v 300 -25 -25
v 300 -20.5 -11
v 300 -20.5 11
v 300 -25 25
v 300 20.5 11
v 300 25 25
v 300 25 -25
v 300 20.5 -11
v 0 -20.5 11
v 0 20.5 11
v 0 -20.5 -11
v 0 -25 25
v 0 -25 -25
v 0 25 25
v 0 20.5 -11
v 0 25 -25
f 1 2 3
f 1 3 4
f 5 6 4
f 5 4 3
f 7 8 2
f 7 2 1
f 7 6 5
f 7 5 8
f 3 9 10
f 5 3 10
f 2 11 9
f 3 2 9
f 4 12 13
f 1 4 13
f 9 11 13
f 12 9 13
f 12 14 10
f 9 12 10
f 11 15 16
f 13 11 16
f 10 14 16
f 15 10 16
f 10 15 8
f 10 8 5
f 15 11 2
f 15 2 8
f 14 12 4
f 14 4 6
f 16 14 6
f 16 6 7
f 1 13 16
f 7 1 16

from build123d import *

# Parameters (mm, degrees)
SKETCH1_W           = 50
SKETCH1_H           = 50
BOSS_EXTRUDE1_DEPTH = 300
CUT_EXTRUDE2_REACH  = 304.076
SKETCH3_W           = 22
SKETCH3_H           = 41


with BuildPart() as part:
    # Sketch1 → Boss-Extrude1 (new body)
    with BuildSketch(Plane(origin=(0, 0, 0), x_dir=(0, 0, -1), z_dir=(1, 0, 0))):
        Rectangle(SKETCH1_W, SKETCH1_H)
    extrude(amount=BOSS_EXTRUDE1_DEPTH)

    # Sketch3 → Cut-Extrude2 (cut, up to next)
    with BuildSketch(Plane.ZY, mode=Mode.PRIVATE) as cut_extrude2_sk1:
        Rectangle(SKETCH3_W, SKETCH3_H)
    cut_extrude2_tool1 = extrude(cut_extrude2_sk1.sketch, amount=-CUT_EXTRUDE2_REACH, mode=Mode.PRIVATE) & part.part
    add(cut_extrude2_tool1.solids().sort_by_distance((0, 0, 0))[0], mode=Mode.SUBTRACT)


solid = part.part
